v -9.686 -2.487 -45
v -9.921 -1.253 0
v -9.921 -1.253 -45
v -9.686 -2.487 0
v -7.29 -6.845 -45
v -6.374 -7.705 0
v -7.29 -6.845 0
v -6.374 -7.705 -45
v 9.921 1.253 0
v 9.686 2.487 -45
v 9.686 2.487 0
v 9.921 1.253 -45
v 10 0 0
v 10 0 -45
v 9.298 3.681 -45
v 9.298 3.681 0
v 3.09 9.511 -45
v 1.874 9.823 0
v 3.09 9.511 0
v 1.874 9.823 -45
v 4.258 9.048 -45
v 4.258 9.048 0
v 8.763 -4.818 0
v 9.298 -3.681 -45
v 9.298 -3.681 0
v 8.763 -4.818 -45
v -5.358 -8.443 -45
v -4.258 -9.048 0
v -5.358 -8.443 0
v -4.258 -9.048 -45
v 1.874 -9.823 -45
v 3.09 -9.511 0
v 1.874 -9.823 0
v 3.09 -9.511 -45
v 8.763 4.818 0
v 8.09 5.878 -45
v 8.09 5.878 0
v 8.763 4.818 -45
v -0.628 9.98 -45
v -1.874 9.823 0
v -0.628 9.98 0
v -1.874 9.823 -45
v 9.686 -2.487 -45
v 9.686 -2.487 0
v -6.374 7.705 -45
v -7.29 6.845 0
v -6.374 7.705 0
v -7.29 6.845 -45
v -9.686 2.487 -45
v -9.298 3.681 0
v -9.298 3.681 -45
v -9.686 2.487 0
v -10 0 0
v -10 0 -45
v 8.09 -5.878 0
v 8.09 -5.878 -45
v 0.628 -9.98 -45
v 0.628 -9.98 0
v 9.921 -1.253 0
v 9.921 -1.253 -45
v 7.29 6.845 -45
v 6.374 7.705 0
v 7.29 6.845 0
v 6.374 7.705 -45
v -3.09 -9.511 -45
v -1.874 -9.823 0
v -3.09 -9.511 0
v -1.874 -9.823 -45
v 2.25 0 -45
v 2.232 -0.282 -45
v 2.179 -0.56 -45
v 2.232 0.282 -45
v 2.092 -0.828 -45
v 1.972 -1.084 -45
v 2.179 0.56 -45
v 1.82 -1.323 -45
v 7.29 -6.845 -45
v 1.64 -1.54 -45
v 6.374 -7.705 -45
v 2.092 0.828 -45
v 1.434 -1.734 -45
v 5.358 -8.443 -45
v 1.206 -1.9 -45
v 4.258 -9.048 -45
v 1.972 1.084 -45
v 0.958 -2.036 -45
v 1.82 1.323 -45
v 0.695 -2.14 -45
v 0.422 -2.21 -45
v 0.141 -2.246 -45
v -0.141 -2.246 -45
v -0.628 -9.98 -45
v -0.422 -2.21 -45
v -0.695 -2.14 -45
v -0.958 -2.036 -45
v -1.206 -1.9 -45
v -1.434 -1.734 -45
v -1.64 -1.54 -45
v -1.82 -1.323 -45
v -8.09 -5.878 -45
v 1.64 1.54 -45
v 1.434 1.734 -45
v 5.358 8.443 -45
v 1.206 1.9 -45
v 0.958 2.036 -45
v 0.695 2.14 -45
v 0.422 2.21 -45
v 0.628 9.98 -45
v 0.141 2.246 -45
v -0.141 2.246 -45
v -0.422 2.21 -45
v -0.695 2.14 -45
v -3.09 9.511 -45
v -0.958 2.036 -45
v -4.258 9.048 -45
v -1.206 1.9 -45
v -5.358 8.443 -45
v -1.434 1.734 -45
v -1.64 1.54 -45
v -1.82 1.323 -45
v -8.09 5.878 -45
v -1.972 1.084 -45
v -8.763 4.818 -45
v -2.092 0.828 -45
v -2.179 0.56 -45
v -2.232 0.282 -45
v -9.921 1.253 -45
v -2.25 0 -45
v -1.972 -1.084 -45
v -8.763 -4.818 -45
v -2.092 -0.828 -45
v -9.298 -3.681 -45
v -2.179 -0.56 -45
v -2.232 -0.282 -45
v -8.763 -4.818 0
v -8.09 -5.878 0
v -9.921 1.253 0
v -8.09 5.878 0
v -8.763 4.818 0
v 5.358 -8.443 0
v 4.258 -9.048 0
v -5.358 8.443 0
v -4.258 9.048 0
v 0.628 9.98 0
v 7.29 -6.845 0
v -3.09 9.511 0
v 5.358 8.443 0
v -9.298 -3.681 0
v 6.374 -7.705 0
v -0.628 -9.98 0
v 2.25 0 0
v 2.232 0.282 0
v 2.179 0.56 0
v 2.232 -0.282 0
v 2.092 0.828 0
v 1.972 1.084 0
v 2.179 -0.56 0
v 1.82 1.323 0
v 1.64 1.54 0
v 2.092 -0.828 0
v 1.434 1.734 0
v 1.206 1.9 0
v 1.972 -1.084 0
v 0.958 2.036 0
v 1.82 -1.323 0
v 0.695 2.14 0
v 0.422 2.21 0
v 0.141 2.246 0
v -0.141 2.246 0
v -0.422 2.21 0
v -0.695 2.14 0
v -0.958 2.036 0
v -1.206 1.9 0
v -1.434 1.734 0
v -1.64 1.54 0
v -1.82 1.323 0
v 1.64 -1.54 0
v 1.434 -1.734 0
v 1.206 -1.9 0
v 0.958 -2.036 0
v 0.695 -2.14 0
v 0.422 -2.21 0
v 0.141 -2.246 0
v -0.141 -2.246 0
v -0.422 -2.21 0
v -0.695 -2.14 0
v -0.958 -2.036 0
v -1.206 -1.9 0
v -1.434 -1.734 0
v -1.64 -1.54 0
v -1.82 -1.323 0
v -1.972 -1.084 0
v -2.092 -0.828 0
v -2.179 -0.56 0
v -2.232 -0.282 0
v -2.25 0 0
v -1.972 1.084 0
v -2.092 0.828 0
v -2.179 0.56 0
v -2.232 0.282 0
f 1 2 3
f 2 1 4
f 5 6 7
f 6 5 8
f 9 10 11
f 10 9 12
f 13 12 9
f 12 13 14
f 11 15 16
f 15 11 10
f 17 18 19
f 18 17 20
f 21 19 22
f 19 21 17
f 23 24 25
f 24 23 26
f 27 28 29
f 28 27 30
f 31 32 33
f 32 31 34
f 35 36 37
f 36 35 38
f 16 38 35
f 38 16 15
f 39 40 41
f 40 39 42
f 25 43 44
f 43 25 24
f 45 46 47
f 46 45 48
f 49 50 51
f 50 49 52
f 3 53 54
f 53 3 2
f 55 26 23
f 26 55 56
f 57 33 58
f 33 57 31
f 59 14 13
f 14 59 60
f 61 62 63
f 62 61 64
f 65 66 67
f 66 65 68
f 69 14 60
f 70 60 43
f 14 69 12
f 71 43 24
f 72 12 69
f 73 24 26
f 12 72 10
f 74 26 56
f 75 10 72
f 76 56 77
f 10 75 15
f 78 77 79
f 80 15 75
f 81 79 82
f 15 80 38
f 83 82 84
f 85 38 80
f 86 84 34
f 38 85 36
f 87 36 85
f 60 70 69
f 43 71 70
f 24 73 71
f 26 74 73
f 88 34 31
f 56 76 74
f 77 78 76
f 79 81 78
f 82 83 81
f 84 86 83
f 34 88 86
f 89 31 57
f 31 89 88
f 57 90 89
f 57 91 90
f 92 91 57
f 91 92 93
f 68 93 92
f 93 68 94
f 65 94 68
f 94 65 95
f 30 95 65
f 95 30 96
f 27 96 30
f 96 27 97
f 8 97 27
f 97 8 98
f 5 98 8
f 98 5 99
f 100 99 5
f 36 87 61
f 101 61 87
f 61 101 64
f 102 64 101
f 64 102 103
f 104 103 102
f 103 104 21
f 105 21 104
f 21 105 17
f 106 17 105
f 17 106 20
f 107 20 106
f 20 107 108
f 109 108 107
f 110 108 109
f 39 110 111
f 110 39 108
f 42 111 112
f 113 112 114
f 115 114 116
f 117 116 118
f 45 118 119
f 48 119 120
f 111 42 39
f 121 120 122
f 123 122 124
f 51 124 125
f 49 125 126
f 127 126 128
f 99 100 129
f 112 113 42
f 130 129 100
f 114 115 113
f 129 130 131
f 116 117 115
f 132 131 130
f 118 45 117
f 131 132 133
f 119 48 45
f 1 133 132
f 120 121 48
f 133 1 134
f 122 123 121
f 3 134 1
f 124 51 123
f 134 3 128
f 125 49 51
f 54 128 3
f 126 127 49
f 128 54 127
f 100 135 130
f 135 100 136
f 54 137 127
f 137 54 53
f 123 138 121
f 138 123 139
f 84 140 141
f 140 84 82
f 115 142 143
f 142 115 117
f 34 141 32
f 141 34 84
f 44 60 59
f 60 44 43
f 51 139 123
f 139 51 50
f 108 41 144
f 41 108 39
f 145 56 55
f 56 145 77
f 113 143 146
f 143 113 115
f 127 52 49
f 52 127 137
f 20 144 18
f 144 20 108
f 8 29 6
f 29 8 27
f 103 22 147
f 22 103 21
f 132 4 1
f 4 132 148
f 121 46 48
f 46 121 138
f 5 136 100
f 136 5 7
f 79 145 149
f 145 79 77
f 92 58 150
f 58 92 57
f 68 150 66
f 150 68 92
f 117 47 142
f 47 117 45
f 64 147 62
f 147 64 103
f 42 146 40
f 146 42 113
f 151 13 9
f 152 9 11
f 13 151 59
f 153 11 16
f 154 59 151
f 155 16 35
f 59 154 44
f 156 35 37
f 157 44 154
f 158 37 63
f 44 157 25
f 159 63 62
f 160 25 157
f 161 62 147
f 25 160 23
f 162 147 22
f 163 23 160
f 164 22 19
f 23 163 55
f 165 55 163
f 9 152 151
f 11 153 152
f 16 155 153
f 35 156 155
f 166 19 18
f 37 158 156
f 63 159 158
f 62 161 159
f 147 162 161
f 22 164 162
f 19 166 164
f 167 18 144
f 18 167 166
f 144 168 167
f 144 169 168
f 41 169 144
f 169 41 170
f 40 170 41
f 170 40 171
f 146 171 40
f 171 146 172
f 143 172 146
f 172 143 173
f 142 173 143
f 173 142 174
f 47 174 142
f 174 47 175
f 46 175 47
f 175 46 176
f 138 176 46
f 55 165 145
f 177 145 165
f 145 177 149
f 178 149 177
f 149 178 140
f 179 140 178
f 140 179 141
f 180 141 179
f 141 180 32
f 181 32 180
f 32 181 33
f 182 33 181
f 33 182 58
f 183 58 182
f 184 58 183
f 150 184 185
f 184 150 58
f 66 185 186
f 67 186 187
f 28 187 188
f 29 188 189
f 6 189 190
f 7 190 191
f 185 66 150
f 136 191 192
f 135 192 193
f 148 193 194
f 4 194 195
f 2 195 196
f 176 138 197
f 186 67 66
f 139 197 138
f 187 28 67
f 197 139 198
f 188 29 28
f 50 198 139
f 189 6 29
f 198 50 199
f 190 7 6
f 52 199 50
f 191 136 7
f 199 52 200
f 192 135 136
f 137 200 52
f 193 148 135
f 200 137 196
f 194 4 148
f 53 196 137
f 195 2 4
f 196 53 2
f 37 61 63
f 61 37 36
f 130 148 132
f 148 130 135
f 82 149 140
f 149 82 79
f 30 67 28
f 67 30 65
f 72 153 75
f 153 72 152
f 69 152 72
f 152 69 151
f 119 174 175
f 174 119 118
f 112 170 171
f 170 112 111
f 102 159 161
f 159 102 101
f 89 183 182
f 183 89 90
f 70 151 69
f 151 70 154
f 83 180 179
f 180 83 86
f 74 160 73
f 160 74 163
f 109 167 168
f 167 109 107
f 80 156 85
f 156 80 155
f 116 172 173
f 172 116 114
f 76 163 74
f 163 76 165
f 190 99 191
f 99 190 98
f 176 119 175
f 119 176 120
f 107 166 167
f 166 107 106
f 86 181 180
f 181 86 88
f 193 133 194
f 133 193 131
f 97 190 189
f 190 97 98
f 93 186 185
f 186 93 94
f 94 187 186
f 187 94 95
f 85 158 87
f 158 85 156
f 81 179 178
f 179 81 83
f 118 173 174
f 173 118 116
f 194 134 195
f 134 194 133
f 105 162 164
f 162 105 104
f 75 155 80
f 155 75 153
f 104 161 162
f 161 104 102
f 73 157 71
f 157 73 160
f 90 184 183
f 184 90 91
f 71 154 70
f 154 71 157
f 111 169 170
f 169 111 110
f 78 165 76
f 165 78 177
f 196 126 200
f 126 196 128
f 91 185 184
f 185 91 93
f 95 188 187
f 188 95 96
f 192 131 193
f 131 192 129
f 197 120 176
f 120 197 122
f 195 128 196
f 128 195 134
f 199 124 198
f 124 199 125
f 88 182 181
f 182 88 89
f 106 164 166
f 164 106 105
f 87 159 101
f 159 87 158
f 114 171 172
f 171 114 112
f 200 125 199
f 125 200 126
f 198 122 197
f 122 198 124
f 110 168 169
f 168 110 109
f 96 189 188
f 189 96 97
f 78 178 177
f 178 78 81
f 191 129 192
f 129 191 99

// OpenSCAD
$fn = 50;


difference() {
	union() {
		translate(v = [0, 0, -45.0000000000]) {
			cylinder(h = 45, r = 10.0000000000);
		}
		cylinder(h = 0, r = 20.0000000000);
	}
	union() {
		#translate(v = [0, 0, -45]) {
			cylinder(h = 45, r = 2.2500000000);
		}
	}
}
